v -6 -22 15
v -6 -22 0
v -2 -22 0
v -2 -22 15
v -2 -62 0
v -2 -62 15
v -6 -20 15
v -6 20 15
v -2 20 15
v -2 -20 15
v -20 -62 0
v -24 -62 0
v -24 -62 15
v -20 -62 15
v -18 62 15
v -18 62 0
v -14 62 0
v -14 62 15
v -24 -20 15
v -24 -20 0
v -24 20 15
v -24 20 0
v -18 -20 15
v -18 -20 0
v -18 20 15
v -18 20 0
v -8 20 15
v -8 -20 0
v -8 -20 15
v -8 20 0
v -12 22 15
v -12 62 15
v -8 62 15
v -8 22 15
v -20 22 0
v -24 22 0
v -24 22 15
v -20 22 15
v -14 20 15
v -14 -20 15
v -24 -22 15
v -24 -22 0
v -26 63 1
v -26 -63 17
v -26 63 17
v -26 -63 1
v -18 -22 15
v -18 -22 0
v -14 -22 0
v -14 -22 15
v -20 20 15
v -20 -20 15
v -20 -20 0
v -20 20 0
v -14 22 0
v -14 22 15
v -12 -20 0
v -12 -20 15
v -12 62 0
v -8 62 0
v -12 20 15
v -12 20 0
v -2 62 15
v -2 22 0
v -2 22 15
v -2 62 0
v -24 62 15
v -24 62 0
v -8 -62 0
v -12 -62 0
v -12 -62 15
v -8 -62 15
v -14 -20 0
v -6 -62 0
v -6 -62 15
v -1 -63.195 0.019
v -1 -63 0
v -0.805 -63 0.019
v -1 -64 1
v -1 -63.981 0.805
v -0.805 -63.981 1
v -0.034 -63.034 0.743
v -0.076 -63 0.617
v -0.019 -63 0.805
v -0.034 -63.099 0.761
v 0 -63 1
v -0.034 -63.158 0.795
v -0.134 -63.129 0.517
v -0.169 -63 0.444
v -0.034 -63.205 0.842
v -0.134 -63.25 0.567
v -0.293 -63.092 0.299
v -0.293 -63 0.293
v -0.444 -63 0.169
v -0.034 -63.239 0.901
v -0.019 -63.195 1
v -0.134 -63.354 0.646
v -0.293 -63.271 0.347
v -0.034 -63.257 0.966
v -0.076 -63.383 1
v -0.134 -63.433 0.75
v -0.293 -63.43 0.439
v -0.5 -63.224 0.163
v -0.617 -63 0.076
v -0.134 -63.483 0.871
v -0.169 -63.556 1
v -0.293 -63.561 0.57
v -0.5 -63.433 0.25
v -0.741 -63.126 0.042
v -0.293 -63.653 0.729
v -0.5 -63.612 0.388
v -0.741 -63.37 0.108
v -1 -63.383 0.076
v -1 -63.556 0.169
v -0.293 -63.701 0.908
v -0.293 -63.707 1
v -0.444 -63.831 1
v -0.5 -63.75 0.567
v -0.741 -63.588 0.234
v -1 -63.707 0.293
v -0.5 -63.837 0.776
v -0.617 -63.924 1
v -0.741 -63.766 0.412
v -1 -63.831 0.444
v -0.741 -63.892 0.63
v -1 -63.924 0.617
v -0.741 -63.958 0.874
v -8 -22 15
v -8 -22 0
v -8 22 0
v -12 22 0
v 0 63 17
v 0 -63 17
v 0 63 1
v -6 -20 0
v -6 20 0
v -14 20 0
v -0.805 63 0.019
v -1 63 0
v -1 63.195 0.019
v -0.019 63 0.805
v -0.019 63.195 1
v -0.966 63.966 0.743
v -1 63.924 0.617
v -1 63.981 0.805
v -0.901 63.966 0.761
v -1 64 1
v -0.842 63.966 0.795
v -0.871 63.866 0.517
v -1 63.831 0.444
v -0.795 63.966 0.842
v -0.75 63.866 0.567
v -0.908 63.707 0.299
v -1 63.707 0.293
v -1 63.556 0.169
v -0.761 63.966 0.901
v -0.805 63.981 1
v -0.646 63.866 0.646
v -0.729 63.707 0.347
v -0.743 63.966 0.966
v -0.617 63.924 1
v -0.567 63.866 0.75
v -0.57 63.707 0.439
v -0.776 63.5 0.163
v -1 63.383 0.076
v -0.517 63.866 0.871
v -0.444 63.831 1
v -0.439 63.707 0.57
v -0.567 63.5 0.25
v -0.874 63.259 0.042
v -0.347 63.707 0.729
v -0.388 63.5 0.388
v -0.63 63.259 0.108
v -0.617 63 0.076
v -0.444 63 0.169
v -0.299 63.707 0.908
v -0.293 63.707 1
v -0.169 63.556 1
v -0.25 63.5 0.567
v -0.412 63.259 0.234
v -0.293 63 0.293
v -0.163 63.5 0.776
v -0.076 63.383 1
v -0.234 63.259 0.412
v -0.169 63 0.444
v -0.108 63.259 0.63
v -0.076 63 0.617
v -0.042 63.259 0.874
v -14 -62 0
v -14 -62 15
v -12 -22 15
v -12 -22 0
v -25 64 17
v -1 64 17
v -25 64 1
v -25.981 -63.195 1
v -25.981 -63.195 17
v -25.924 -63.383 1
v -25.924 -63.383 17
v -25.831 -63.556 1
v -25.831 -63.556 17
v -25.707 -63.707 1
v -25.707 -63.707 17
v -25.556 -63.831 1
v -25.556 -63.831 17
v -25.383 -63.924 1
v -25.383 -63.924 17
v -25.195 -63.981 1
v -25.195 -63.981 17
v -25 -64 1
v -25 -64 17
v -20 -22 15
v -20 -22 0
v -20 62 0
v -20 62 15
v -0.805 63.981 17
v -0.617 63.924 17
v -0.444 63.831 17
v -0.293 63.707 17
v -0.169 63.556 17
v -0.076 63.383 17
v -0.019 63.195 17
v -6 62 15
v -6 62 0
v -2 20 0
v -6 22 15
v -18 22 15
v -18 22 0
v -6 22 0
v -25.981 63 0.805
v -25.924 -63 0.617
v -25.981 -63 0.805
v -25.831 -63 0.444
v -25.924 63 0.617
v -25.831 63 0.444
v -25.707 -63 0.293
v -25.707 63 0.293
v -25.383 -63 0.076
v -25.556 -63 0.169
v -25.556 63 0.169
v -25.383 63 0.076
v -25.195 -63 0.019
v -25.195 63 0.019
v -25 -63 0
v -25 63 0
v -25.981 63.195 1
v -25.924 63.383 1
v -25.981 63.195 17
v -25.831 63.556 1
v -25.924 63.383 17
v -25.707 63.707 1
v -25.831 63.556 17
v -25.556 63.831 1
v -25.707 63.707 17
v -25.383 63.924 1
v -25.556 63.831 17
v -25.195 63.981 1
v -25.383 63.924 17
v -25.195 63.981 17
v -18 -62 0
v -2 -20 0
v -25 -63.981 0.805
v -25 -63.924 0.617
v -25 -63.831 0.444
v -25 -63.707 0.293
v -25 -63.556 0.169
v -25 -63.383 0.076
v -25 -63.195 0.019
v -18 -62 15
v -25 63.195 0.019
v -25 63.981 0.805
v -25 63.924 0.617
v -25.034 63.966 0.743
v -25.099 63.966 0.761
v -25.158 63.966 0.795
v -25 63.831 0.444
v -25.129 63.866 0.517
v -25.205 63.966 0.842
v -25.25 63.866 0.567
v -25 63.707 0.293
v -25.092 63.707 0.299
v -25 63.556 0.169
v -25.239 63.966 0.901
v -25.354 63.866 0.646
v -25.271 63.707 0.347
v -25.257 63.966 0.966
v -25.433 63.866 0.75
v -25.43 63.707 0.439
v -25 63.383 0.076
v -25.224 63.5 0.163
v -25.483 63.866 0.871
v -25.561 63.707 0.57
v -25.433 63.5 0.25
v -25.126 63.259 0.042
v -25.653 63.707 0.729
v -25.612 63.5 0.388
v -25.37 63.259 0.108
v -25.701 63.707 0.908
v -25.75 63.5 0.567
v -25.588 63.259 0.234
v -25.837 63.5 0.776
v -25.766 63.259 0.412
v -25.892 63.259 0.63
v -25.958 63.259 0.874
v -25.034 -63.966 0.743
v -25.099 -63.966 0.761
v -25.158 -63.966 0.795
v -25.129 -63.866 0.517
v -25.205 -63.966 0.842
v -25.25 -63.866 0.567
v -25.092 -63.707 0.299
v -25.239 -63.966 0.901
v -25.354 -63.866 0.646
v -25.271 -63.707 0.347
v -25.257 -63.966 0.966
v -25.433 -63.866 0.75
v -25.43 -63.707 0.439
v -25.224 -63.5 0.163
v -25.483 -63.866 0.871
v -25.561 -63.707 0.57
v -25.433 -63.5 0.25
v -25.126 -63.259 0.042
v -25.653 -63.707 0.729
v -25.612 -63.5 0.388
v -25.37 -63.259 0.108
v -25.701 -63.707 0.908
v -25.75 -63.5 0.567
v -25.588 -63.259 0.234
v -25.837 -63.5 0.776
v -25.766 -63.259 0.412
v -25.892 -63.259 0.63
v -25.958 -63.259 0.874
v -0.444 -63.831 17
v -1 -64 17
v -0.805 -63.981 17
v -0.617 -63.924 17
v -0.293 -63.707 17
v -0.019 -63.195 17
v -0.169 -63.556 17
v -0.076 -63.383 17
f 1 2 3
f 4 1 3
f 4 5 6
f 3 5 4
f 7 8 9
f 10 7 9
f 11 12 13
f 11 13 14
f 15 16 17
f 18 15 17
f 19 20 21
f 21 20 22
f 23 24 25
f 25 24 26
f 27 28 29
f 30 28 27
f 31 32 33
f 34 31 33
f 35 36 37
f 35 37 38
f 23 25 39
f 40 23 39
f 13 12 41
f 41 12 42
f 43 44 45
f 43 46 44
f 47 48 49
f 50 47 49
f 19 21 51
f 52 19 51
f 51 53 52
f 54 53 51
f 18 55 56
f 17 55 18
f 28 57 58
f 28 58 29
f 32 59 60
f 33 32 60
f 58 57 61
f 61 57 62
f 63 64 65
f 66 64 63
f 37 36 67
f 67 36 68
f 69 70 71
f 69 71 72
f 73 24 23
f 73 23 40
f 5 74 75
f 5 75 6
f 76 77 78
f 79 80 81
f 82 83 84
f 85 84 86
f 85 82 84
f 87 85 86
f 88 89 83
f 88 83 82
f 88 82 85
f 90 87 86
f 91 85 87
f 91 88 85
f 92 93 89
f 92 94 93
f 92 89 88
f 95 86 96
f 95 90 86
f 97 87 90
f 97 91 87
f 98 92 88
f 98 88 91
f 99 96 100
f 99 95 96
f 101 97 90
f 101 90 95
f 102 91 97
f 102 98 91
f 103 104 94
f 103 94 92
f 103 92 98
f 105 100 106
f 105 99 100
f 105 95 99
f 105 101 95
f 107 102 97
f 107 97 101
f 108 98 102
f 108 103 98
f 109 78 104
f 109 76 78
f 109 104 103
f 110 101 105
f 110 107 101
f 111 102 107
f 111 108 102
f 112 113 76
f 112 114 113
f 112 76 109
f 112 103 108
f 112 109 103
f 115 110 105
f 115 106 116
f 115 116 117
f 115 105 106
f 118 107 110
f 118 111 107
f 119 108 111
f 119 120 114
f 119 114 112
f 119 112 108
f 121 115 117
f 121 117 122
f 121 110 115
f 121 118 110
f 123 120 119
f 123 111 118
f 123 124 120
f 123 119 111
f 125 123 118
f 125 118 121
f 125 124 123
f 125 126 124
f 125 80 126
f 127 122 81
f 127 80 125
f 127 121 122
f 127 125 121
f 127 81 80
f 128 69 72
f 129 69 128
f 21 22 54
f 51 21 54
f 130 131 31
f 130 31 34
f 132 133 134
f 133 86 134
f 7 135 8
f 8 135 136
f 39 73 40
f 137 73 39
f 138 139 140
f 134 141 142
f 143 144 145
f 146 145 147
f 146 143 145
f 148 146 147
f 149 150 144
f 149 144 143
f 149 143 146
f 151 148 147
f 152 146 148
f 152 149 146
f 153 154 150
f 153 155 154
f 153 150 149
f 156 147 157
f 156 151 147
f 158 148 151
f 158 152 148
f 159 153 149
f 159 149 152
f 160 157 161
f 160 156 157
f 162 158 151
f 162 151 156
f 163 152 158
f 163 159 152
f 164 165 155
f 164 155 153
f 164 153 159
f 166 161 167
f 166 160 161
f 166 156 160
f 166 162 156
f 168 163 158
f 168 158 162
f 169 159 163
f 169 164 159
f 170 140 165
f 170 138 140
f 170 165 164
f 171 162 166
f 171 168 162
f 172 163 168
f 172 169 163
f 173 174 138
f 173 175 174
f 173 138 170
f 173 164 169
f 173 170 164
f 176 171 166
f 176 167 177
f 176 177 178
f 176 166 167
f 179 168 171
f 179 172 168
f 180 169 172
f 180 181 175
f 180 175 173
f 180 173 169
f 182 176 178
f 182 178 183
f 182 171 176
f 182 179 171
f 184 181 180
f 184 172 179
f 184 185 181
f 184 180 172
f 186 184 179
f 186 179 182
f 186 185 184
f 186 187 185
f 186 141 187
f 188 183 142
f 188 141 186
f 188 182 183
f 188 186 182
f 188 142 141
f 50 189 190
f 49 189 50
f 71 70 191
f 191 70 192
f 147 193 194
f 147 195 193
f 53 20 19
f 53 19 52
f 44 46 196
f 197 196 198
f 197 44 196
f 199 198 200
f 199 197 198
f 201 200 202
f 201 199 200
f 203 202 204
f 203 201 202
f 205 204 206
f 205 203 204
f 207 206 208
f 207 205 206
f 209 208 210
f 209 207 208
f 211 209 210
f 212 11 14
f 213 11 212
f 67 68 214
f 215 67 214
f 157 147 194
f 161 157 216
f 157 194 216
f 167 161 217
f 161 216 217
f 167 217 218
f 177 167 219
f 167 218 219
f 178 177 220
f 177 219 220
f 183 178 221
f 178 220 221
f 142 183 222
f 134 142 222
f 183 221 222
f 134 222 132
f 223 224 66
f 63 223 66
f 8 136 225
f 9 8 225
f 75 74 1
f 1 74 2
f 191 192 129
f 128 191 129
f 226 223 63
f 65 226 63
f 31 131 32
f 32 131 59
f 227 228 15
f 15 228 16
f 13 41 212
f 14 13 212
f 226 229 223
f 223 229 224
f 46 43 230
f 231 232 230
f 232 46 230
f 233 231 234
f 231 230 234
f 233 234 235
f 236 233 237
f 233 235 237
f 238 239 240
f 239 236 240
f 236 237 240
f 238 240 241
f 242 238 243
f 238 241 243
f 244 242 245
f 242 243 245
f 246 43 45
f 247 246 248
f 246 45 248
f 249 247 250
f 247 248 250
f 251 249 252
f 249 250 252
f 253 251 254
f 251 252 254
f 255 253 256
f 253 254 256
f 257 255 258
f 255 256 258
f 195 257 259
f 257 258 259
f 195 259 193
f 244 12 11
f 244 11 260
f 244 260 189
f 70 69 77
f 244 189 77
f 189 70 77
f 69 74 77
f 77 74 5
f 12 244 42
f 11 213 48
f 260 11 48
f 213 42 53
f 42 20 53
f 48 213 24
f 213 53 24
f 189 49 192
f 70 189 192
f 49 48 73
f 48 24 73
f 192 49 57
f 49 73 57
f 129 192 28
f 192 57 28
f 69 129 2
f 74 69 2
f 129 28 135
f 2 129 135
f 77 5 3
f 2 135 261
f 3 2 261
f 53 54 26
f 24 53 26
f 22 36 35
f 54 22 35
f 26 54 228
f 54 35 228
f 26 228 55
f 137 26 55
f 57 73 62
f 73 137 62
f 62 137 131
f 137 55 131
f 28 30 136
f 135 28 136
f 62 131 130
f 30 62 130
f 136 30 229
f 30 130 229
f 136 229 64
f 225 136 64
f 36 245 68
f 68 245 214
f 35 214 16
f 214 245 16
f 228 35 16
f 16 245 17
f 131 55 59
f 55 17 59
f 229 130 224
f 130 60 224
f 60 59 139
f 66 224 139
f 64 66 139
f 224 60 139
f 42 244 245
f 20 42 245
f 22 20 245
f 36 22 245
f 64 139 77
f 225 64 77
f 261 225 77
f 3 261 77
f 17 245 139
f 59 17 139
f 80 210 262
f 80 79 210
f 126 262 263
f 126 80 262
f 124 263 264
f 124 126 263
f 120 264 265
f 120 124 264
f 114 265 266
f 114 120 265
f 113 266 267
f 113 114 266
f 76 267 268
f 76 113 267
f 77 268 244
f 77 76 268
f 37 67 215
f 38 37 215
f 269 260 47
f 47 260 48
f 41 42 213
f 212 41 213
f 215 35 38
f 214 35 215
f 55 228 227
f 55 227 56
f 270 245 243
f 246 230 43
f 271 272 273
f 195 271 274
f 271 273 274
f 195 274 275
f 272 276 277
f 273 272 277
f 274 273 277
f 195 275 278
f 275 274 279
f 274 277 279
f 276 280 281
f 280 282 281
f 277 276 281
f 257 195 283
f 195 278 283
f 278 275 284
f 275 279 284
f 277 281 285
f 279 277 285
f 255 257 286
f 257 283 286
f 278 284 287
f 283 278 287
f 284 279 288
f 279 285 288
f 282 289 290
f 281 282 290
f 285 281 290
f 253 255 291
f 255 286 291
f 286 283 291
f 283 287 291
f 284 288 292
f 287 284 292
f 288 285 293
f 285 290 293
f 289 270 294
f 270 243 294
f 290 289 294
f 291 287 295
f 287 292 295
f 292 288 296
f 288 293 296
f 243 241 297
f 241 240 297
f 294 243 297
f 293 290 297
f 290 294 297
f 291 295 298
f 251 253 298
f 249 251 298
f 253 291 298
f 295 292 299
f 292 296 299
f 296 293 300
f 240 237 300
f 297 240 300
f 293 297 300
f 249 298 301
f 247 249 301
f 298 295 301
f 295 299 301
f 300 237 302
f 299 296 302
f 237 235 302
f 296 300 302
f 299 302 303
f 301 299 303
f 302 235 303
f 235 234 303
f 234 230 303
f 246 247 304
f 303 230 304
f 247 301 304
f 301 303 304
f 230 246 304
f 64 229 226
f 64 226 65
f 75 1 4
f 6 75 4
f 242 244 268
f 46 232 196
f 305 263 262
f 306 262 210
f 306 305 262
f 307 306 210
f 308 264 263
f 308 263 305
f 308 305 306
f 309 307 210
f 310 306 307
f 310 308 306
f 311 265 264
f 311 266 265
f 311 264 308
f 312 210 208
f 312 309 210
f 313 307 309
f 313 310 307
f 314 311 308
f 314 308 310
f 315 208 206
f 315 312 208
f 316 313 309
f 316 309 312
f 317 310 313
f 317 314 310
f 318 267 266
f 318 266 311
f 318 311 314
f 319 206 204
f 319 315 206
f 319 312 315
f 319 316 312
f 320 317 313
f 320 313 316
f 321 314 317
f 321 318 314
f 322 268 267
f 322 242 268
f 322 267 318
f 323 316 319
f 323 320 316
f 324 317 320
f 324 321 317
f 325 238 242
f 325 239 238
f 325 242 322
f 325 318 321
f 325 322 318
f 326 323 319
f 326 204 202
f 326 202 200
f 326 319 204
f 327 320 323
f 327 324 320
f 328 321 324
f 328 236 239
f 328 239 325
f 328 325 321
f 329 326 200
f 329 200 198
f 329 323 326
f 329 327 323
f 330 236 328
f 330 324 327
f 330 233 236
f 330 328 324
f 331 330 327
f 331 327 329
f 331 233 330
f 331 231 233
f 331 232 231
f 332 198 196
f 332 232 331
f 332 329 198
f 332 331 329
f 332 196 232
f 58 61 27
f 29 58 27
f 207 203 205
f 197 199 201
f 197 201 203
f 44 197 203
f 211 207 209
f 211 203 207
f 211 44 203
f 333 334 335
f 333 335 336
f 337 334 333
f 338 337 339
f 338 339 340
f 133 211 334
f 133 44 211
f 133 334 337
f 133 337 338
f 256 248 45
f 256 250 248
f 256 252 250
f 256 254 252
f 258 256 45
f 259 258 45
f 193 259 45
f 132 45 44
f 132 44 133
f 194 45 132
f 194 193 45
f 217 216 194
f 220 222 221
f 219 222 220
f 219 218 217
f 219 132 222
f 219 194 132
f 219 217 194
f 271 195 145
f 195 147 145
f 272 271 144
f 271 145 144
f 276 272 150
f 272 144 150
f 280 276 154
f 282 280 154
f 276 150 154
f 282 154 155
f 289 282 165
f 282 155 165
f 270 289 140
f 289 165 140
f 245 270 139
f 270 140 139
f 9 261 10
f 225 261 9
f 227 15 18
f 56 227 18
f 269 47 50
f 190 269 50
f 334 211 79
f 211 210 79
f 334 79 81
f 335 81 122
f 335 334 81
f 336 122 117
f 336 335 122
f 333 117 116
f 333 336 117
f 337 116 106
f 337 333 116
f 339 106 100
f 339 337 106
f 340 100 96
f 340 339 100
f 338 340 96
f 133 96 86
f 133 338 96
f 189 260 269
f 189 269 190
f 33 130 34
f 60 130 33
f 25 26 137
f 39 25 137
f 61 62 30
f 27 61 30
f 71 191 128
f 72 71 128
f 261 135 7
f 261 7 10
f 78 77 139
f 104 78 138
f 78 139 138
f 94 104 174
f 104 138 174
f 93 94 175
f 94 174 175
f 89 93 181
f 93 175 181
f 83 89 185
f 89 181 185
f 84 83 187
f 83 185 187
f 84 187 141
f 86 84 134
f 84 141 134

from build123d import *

# Parameters (mm, degrees)
F0_W     = 26
F0_H     = 128
F1_DEPTH = 17
F2_W     = 4
F2_H     = 40
F3_DEPTH = 15
F4_R     = 1


with BuildPart() as f1:
    # F0 (on Top) → F1 (new body)
    with BuildSketch(Plane.XY):
        with Locations((-13, 0)):
            Rectangle(F0_W, F0_H)
    extrude(amount=F1_DEPTH)

    # F2 (on Top) → F3 (cut)
    with BuildSketch(Plane.XY):
        with Locations((-10, 42)):
            Rectangle(F2_W, F2_H)
        with Locations((-4, 42)):
            Rectangle(F2_W, F2_H)
        with Locations((-16, 0)):
            Rectangle(F2_W, F2_H)
        with Locations((-10, 0)):
            Rectangle(F2_W, F2_H)
        with Locations((-4, 0)):
            Rectangle(F2_W, F2_H)
        with Locations((-16, -42)):
            Rectangle(F2_W, F2_H)
        with Locations((-10, -42)):
            Rectangle(F2_W, F2_H)
        with Locations((-4, -42)):
            Rectangle(F2_W, F2_H)
        with Locations((-16, 42)):
            Rectangle(F2_W, F2_H)
        with Locations((-22, 42)):
            Rectangle(F2_W, F2_H)
        with Locations((-22, 0)):
            Rectangle(F2_W, F2_H)
        with Locations((-22, -42)):
            Rectangle(F2_W, F2_H)
    extrude(amount=F3_DEPTH, mode=Mode.SUBTRACT)

    # F4
    f4_edges = [f1.edges().sort_by_distance(p)[0] for p in [
        (-26, 0, 0),
        (-13, -64, 0),
        (0, 0, 0),
        (-13, 64, 0),
        (-26, 64, 8.5),
        (0, 64, 8.5),
        (-26, -64, 8.5),
        (0, -64, 8.5),
    ]]
    fillet(f4_edges, radius=F4_R)


solid = f1.part
